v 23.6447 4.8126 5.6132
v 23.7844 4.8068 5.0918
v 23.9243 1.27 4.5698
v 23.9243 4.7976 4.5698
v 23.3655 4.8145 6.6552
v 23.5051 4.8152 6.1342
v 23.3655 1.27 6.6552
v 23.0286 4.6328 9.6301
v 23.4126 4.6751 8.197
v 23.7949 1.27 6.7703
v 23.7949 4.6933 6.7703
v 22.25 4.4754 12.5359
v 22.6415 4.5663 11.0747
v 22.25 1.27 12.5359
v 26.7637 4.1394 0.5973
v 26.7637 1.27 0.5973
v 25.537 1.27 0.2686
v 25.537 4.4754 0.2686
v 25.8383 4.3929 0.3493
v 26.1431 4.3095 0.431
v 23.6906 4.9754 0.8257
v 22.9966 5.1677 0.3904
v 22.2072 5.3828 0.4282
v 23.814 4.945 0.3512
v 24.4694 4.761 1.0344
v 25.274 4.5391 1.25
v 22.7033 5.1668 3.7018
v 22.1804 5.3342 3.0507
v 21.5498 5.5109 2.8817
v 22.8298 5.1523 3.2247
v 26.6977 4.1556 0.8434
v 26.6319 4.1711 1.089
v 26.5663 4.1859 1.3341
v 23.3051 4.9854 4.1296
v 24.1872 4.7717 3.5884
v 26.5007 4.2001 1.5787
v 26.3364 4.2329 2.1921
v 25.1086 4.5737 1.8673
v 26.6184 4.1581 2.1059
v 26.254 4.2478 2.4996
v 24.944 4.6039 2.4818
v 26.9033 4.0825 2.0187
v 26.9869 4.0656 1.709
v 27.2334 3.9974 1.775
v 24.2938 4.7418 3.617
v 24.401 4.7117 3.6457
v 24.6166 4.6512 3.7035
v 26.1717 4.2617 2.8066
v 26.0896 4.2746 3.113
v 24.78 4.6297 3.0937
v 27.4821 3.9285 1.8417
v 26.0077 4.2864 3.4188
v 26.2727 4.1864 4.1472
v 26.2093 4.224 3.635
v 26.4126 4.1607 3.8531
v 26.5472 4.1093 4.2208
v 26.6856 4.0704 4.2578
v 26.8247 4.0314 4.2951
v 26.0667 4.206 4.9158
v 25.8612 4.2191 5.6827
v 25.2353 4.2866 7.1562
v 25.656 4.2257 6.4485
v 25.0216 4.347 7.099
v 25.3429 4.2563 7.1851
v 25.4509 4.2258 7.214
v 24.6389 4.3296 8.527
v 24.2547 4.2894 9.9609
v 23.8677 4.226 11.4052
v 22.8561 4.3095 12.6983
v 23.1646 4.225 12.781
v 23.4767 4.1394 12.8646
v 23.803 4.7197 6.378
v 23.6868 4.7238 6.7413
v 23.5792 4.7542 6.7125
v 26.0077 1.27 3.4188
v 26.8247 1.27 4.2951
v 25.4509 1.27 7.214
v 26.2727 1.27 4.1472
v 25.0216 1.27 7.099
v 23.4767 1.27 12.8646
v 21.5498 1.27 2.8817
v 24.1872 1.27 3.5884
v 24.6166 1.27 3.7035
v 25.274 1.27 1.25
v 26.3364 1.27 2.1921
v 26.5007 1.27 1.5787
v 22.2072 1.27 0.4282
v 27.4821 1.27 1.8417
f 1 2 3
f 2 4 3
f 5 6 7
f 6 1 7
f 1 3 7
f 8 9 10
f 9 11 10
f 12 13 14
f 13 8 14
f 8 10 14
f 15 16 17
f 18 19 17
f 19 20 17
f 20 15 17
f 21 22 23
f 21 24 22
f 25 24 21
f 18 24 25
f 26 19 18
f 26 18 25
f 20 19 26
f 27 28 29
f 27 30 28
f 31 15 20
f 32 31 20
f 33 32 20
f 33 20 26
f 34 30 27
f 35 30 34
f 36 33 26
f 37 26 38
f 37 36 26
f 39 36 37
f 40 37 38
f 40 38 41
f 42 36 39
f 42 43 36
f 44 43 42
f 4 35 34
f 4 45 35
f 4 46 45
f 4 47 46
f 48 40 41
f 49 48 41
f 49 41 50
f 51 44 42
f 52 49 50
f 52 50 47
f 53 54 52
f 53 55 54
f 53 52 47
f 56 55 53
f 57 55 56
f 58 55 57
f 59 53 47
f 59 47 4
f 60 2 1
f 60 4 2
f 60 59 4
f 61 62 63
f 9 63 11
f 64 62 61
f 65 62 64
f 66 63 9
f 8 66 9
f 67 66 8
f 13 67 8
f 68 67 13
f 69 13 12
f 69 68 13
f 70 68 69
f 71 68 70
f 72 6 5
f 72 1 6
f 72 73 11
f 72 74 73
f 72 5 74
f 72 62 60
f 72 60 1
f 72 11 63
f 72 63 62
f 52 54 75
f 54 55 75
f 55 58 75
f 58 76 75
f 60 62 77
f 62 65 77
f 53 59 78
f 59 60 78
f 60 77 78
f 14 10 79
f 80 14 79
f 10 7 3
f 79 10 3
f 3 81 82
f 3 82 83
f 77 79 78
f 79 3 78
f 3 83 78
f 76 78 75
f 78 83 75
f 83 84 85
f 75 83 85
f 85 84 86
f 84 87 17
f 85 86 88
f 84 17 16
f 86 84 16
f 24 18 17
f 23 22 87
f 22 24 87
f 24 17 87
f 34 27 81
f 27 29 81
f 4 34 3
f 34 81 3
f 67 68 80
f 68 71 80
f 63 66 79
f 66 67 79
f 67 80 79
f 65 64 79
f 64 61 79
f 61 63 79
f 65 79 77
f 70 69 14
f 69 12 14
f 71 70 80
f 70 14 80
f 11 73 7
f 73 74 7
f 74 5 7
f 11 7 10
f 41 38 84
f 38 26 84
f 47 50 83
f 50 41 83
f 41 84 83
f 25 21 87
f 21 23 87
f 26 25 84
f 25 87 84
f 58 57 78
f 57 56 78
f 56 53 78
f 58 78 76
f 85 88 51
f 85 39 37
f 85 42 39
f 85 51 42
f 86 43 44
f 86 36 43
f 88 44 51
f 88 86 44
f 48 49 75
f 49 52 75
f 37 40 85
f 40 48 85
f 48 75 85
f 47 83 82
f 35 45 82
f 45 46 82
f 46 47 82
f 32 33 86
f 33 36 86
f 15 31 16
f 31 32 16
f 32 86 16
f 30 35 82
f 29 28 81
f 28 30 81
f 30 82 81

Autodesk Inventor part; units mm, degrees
ref_plane "YZ Plane" through (0, 0, 0) normal (1, 0, 0) x (0, 1, 0)
ref_plane "XZ Plane" through (0, 0, 0) normal (0, 1, 0) x (-1, 0, 0)
ref_plane "XY Plane" through (0, 0, 0) normal (0, 0, 1) x (1, 0, 0)
sketch "Sketch1" plane through (0, 0, 0) normal (0, 0, 1) x (1, 0, 0)
  line L0 (0, 0) -> (0, 8.6646) construction
  line L1 (20.9931, 1.27) -> (20.9931, 5.715)
  line L2 (20.9931, 5.715) -> (27.9781, 3.81)
  line L3 (27.9781, 3.81) -> (27.9781, 0)
  line L4 (27.9781, 0) -> (20.9931, 0)
  line L5 (20.9931, 1.27) -> (18.4531, 1.27)
  line L6 (18.4531, 1.27) -> (18.4531, 0)
  line L7 (18.4531, 0) -> (20.9931, 0)
  dimension "d0" = 20.9931
  dimension "d1" = 4.445
  dimension "d2" = 1.27
  dimension "d3" = 2.54
  dimension "d4" = 3.81
  dimension "d5" = 6.985
revolve "Revolution1" add sketch "Sketch1" angle 360 about axis through (0, 0, 0) along (0, 1, 0)
sketch "Sketch2" plane through (0, 1.27, 0) normal (0, 1, 0) x (1, 0, 0)
  circle A0 centre (0, 0) radius 20.9931 projected
  circle A1 centre (0, 0) radius 27.9781 projected
  circle A2 centre (0, 0) radius 18.4531 projected
  line L0 (-4.2505, -7.1349) -> (4.1315, -7.1349) projected
  circle A3 centre (0, 0) radius 19.685 projected
  line L1 (-12.7595, -2.2222) -> (-12.7595, -29.7716) construction
  line L2 (12.6405, -2.2222) -> (12.6405, -30.8961) construction
  line L3 (-12.7549, -7.1349) -> (-31.6502, -7.1349) construction
  line L4 (0, 0) -> (17.3317, 30.0193) construction
  line L5 (-18.5741, 9.7833) -> (-25.4, 9.7833)
  line L6 (-18.8949, 9.1483) -> (-25.4, 9.1483)
  line L7 (-25.4, 9.1483) -> (-25.4, 9.7833)
  line L8 (-19.8553, -6.8174) -> (-25.4, -6.8174)
  line L9 (-25.4, -6.8174) -> (-25.4, -7.4524)
  line L10 (-25.4, -7.4524) -> (-19.6258, -7.4524)
  line L11 (0.1351, 9.4658) -> (-31.517, 9.4658) construction
  line L12 (-24.13, 9.1483) -> (-22.86, 6.9486)
  line L13 (-22.86, 6.9486) -> (-25.4, 6.9486)
  line L14 (-25.4, 6.9486) -> (-24.13, 9.1483)
  line L15 (-24.13, -6.8174) -> (-25.4, -4.6177)
  line L16 (-25.4, -4.6177) -> (-22.86, -4.6177)
  line L17 (-22.86, -4.6177) -> (-24.13, -6.8174)
  line L18 (-29.0818, 1.1654) -> (-16.5563, 1.1654) construction
  line L19 (-24.13, 7.6818) -> (-24.13, -5.3509) construction
  line L20 (-23.8125, 2.4354) -> (-24.4475, 2.4354)
  line L21 (-24.4475, 2.4354) -> (-24.4475, 6.9486)
  line L22 (-24.4475, 6.9486) -> (-23.8125, 6.9486)
  line L23 (-23.8125, 6.9486) -> (-23.8125, 2.4354)
  line L24 (-23.8125, 2.4354) -> (-24.4475, 6.9486) construction
  line L25 (-24.4475, 2.4354) -> (-23.8125, 6.9486) construction
  line L26 (-23.8125, -0.1046) -> (-24.4475, -0.1046)
  line L27 (-24.4475, -0.1046) -> (-24.4475, -4.6177)
  line L28 (-24.4475, -4.6177) -> (-23.8125, -4.6177)
  line L29 (-23.8125, -4.6177) -> (-23.8125, -0.1046)
  line L30 (-23.8125, -0.1046) -> (-24.4475, -4.6177) construction
  line L31 (-24.4475, -0.1046) -> (-23.8125, -4.6177) construction
  line L32 (-13.077, -16.4226) -> (-13.077, -23.7886)
  line L33 (-13.077, -23.7886) -> (-12.442, -23.7886)
  line L34 (-12.442, -23.7886) -> (-12.442, -16.9088)
  line L35 (12.323, -16.9957) -> (12.323, -23.7886)
  line L36 (12.323, -23.7886) -> (12.958, -23.7886)
  line L37 (12.958, -23.7886) -> (12.958, -16.5167)
  line L38 (-12.442, -22.5186) -> (-10.2423, -21.2486)
  line L39 (-10.2423, -21.2486) -> (-10.2423, -23.7886)
  line L40 (-10.2423, -23.7886) -> (-12.442, -22.5186)
  line L41 (12.323, -22.5186) -> (10.1233, -23.7886)
  line L42 (10.1233, -23.7886) -> (10.1233, -21.2486)
  line L43 (10.1233, -21.2486) -> (12.323, -22.5186)
  line L44 (-3.8695, -21.2486) -> (3.7505, -21.2486) construction
  line L45 (3.7505, -21.2486) -> (3.7505, -23.7886) construction
  line L46 (3.7505, -23.7886) -> (-3.8695, -23.7886) construction
  line L47 (-3.8695, -23.7886) -> (-3.8695, -21.2486) construction
  line L48 (-0.0595, -13.6296) -> (-0.0595, -32.797) construction
  line L49 (-10.2423, -22.5186) -> (10.1233, -22.5186) construction
  line L50 (-4.2505, -22.8361) -> (-10.2423, -22.8361)
  line L51 (-10.2423, -22.8361) -> (-10.2423, -22.2011)
  line L52 (-10.2423, -22.2011) -> (-4.2505, -22.2011)
  line L53 (-4.2505, -22.2011) -> (-4.2505, -22.8361)
  line L54 (-4.2505, -22.8361) -> (-10.2423, -22.2011) construction
  line L55 (-10.2423, -22.8361) -> (-4.2505, -22.2011) construction
  line L56 (4.1315, -22.2011) -> (10.1233, -22.2011)
  line L57 (10.1233, -22.2011) -> (10.1233, -22.8361)
  line L58 (10.1233, -22.8361) -> (4.1315, -22.8361)
  line L59 (4.1315, -22.8361) -> (4.1315, -22.2011)
  line L60 (4.1315, -22.2011) -> (10.1233, -22.8361) construction
  line L61 (10.1233, -22.2011) -> (4.1315, -22.8361) construction
  line L62 (10.2204, 18.3372) -> (11.1133, 19.8839)
  line L63 (11.1133, 19.8839) -> (11.6633, 19.5664)
  line L64 (11.6633, 19.5664) -> (10.7703, 18.0197)
  line L65 (12.8992, 20.8364) -> (18.6142, 20.8364) construction
  line L66 (18.6142, 20.8364) -> (18.6142, 18.2964) construction
  line L67 (18.6142, 18.2964) -> (12.8992, 18.2964) construction
  line L68 (12.8992, 18.2964) -> (12.8992, 20.8364) construction
  line L69 (11.1133, 19.8839) -> (12.8992, 19.8839)
  line L70 (12.8992, 19.8839) -> (12.8992, 19.2489)
  line L71 (12.8992, 19.2489) -> (11.1133, 19.2489)
  line L72 (11.1133, 19.2489) -> (11.1133, 19.8839)
  line L73 (11.1133, 19.8839) -> (12.8992, 19.2489) construction
  line L74 (12.8992, 19.8839) -> (11.1133, 19.2489) construction
  circle A4 centre (0, 0) radius 22.8981 construction
  line L75 (11.4654, -8.564) -> (6.3194, -8.564) projected
  spline S0 degree 2 poles (-4.3048, 23.0885) (-4.5009, 22.6771) (-4.9694, 22.2828) (-5.345, 22.1916) knots 0 0 0 1 2 2 2
  spline S1 degree 2 poles (-5.345, 22.1916) (-5.9856, 22.0361) (-6.5218, 22.4794) knots 0 0 0 1 1 1
  spline S2 degree 2 poles (-6.5218, 22.4794) (-7.071, 22.9258) (-7.2859, 23.8109) knots 0 0 0 1 1 1
  spline S3 degree 2 poles (-7.2859, 23.8109) (-7.5233, 24.7892) (-7.1789, 25.4155) knots 0 0 0 1 1 1
  spline S4 degree 2 poles (-7.1789, 25.4155) (-6.903, 25.9172) (-6.3614, 26.0486) knots 0 0 0 1 1 1
  spline S5 degree 2 poles (-6.3614, 26.0486) (-5.9392, 26.1511) (-5.6643, 26.0853) knots 0 0 0 1 1 1
  spline S6 degree 2 poles (-5.6643, 26.0853) (-5.3596, 26.0112) (-5.0862, 25.7107) knots 0 0 0 1 1 1
  spline S7 degree 2 poles (-5.0862, 25.7107) (-5.0278, 25.6478) (-5.0115, 25.5808) knots 0 0 0 1 1 1
  spline S8 degree 2 poles (-5.0115, 25.5808) (-4.9832, 25.4644) (-5.1191, 25.2618) (-5.2268, 25.2357) knots 0 0 0 1 2 2 2
  spline S9 degree 2 poles (-5.2268, 25.2357) (-5.3782, 25.1989) (-5.5051, 25.3408) knots 0 0 0 1 1 1
  spline S10 degree 2 poles (-5.5051, 25.3408) (-5.6451, 25.4856) (-5.8317, 25.5174) knots 0 0 0 1 1 1
  spline S11 degree 2 poles (-5.8317, 25.5174) (-5.9746, 25.5475) (-6.2279, 25.486) knots 0 0 0 1 1 1
  spline S12 degree 2 poles (-6.2279, 25.486) (-6.5569, 25.4061) (-6.7127, 25.0569) knots 0 0 0 1 1 1
  spline S13 degree 2 poles (-6.7127, 25.0569) (-6.906, 24.6338) (-6.7385, 23.9438) knots 0 0 0 1 1 1
  spline S14 degree 2 poles (-6.7385, 23.9438) (-6.5844, 23.309) (-5.8687, 22.6596) (-5.4727, 22.7557) knots 0 0 0 1 2 2 2
  spline S15 degree 2 poles (-5.4727, 22.7557) (-5.0447, 22.8596) (-4.8204, 23.3456) knots 0 0 0 1 1 1
  spline S16 degree 2 poles (-4.8204, 23.3456) (-4.7629, 23.4644) (-4.6377, 23.4948) knots 0 0 0 1 1 1
  spline S17 degree 2 poles (-4.6377, 23.4948) (-4.53, 23.521) (-4.3078, 23.393) (-4.2802, 23.2794) knots 0 0 0 1 2 2 2
  spline S18 degree 2 poles (-4.2802, 23.2794) (-4.2576, 23.1863) (-4.3048, 23.0885) knots 0 0 0 1 1 1
  spline S19 degree 2 poles (-2.5624, 23.1168) (-2.545, 22.971) (-2.7214, 22.7539) (-2.8582, 22.7376) knots 0 0 0 1 2 2 2
  spline S20 degree 2 poles (-2.8582, 22.7376) (-3.007, 22.7199) (-3.2201, 22.8877) (-3.2378, 23.0364) knots 0 0 0 1 2 2 2
  spline S21 degree 2 poles (-3.2378, 23.0364) (-3.254, 23.1733) (-3.087, 23.3923) (-2.9382, 23.41) knots 0 0 0 1 2 2 2
  spline S22 degree 2 poles (-2.9382, 23.41) (-2.8014, 23.4263) (-2.5783, 23.2507) (-2.5624, 23.1168) knots 0 0 0 1 2 2 2
  spline S23 degree 2 poles (1.6575, 23.2292) (1.6783, 23.1693) (1.6781, 23.1183) knots 0 0 0 1 1 1
  spline S24 degree 2 poles (1.6781, 23.1183) (1.6778, 22.9955) (1.4946, 22.8432) (1.3837, 22.8435) knots 0 0 0 1 2 2 2
  spline S25 degree 2 poles (1.3837, 22.8435) (1.189, 22.844) (1.1206, 23.024) knots 0 0 0 1 1 1
  line L76 (1.1206, 23.024) -> (0.9153, 23.5578)
  line L77 (0.9153, 23.5578) -> (-0.8255, 23.5626)
  line L78 (-0.8255, 23.5626) -> (-1.0307, 23.0328)
  spline S26 degree 2 poles (-1.0307, 23.0328) (-1.1001, 22.8503) (-1.2888, 22.8508) knots 0 0 0 1 1 1
  spline S27 degree 2 poles (-1.2888, 22.8508) (-1.4087, 22.8511) (-1.585, 23.0074) (-1.5847, 23.1272) knots 0 0 0 1 2 2 2
  spline S28 degree 2 poles (-1.5847, 23.1272) (-1.5846, 23.1812) (-1.5665, 23.2291) knots 0 0 0 1 1 1
  line L79 (-1.5665, 23.2291) -> (-0.2988, 26.5993)
  spline S29 degree 2 poles (-0.2988, 26.5993) (-0.2174, 26.8148) (0.0283, 26.8141) knots 0 0 0 1 1 1
  spline S30 degree 2 poles (0.0283, 26.8141) (0.28, 26.8135) (0.3484, 26.6245) knots 0 0 0 1 1 1
  line L80 (0.3484, 26.6245) -> (1.6575, 23.2292)
  line L81 (0.7221, 24.1366) -> (0.026, 25.9722)
  line L82 (0.026, 25.9722) -> (-0.6322, 24.1403)
  line L83 (-0.6322, 24.1403) -> (0.7221, 24.1366)
  spline S31 degree 2 poles (3.0603, 23.0562) (3.0422, 22.9105) (2.8189, 22.742) (2.6821, 22.7591) knots 0 0 0 1 2 2 2
  spline S32 degree 2 poles (2.6821, 22.7591) (2.5335, 22.7776) (2.3669, 22.9916) (2.3854, 23.1402) knots 0 0 0 1 2 2 2
  spline S33 degree 2 poles (2.3854, 23.1402) (2.4024, 23.277) (2.6172, 23.4495) (2.7658, 23.431) knots 0 0 0 1 2 2 2
  spline S34 degree 2 poles (2.7658, 23.431) (2.9026, 23.414) (3.077, 23.19) (3.0603, 23.0562) knots 0 0 0 1 2 2 2
  spline S35 degree 2 poles (7.2494, 23.9177) (6.9985, 22.8964) (6.3258, 22.4939) knots 0 0 0 1 1 1
  spline S36 degree 2 poles (6.3258, 22.4939) (5.7821, 22.1647) (5.1478, 22.3205) knots 0 0 0 1 1 1
  line L84 (5.1478, 22.3205) -> (4.1323, 22.5699)
  line L85 (4.1323, 22.5699) -> (5.0564, 26.3321)
  line L86 (5.0564, 26.3321) -> (6.069, 26.0834)
  spline S37 degree 2 poles (6.069, 26.0834) (6.6946, 25.9298) (7.047, 25.4051) knots 0 0 0 1 1 1
  spline S38 degree 2 poles (7.047, 25.4051) (7.4616, 24.7818) (7.2494, 23.9177) knots 0 0 0 1 1 1
  spline S39 degree 2 poles (6.7023, 24.052) (6.8474, 24.6427) (6.5732, 25.0587) knots 0 0 0 1 1 1
  spline S40 degree 2 poles (6.5732, 25.0587) (6.337, 25.416) (5.9267, 25.5167) knots 0 0 0 1 1 1
  line L87 (5.9267, 25.5167) -> (5.4641, 25.6304)
  line L88 (5.4641, 25.6304) -> (4.8173, 22.9971)
  line L89 (4.8173, 22.9971) -> (5.2857, 22.882)
  spline S41 degree 2 poles (5.2857, 22.882) (5.7047, 22.7791) (6.047, 22.9666) knots 0 0 0 1 1 1
  spline S42 degree 2 poles (6.047, 22.9666) (6.5215, 23.3159) (6.7023, 24.052) knots 0 0 0 1 1 1
  line L90 (-26.9128, 0.2129) -> (-27.3651, 0.2129)
  line L91 (-27.3651, 0.2129) -> (-27.3651, 0.7162)
  line L92 (-27.3651, 0.7162) -> (-26.9128, 0.7162)
  line L93 (-26.9128, 0.7162) -> (-26.9128, 0.2129)
  spline S43 degree 2 poles (-25.1468, 0.8613) (-25.1468, 0.5603) (-25.5281, 0.1728) (-25.8615, 0.1728) knots 0 0 0 1 2 2 2
  spline S44 degree 2 poles (-25.8615, 0.1728) (-26.0282, 0.1728) (-26.2891, 0.2685) (-26.3802, 0.3627) knots 0 0 0 1 2 2 2
  spline S45 degree 2 poles (-26.3802, 0.3627) (-26.4883, 0.4723) (-26.6041, 0.8196) (-26.6041, 1.062) knots 0 0 0 1 2 2 2
  spline S46 degree 2 poles (-26.6041, 1.062) (-26.6041, 1.3121) (-26.496, 1.7011) (-26.374, 1.8509) knots 0 0 0 1 2 2 2
  spline S47 degree 2 poles (-26.374, 1.8509) (-26.2583, 1.9929) (-25.8816, 2.1535) (-25.6238, 2.1535) knots 0 0 0 1 2 2 2
  spline S48 degree 2 poles (-25.6238, 2.1535) (-25.5296, 2.1535) (-25.3413, 2.1288) (-25.3073, 2.121) knots 0 0 0 1 2 2 2
  line L94 (-25.3073, 2.121) -> (-25.3073, 1.7474)
  line L95 (-25.3073, 1.7474) -> (-25.3413, 1.7474)
  spline S49 degree 2 poles (-25.3413, 1.7474) (-25.3752, 1.7644) (-25.5296, 1.8061) (-25.6284, 1.8061) knots 0 0 0 1 2 2 2
  spline S50 degree 2 poles (-25.6284, 1.8061) (-25.8523, 1.8061) (-26.0962, 1.5699) (-26.1255, 1.3507) knots 0 0 0 1 2 2 2
  spline S51 degree 2 poles (-26.1255, 1.3507) (-26.0313, 1.4109) (-25.8384, 1.4819) (-25.7164, 1.4819) knots 0 0 0 1 2 2 2
  spline S52 degree 2 poles (-25.7164, 1.4819) (-25.613, 1.4819) (-25.4324, 1.4263) (-25.3629, 1.3739) knots 0 0 0 1 2 2 2
  spline S53 degree 2 poles (-25.3629, 1.3739) (-25.2641, 1.2982) (-25.1468, 1.0528) (-25.1468, 0.8613) knots 0 0 0 1 2 2 2
  spline S54 degree 2 poles (-25.7041, 0.5742) (-25.667, 0.6205) (-25.6269, 0.7286) (-25.6269, 0.8382) knots 0 0 0 1 2 2 2
  spline S55 degree 2 poles (-25.6269, 0.8382) (-25.6269, 0.9308) (-25.6732, 1.0512) (-25.7149, 1.0867) knots 0 0 0 1 2 2 2
  spline S56 degree 2 poles (-25.7149, 1.0867) (-25.7581, 1.1238) (-25.8646, 1.15) (-25.9248, 1.15) knots 0 0 0 1 2 2 2
  spline S57 degree 2 poles (-25.9248, 1.15) (-25.9758, 1.15) (-26.0807, 1.1238) (-26.127, 1.1052) knots 0 0 0 1 2 2 2
  spline S58 degree 2 poles (-26.127, 1.1052) (-26.127, 1.0929) (-26.1301, 1.0342) (-26.1301, 0.9895) knots 0 0 0 1 2 2 2
  spline S59 degree 2 poles (-26.1301, 0.9895) (-26.1301, 0.8243) (-26.073, 0.6251) (-26.0282, 0.5742) knots 0 0 0 1 2 2 2
  spline S60 degree 2 poles (-26.0282, 0.5742) (-25.9958, 0.5325) (-25.9094, 0.497) (-25.8631, 0.497) knots 0 0 0 1 2 2 2
  spline S61 degree 2 poles (-25.8631, 0.497) (-25.8245, 0.497) (-25.7349, 0.5356) (-25.7041, 0.5742) knots 0 0 0 1 2 2 2
  spline S62 degree 2 poles (-23.5104, 0.8582) (-23.5104, 0.7085) (-23.6123, 0.4553) (-23.7126, 0.3642) knots 0 0 0 1 2 2 2
  spline S63 degree 2 poles (-23.7126, 0.3642) (-23.8129, 0.2732) (-24.0877, 0.1728) (-24.2884, 0.1728) knots 0 0 0 1 2 2 2
  spline S64 degree 2 poles (-24.2884, 0.1728) (-24.5015, 0.1744) (-24.8071, 0.2438) (-24.9075, 0.2886) knots 0 0 0 1 2 2 2
  line L96 (-24.9075, 0.2886) -> (-24.9075, 0.7039)
  line L97 (-24.9075, 0.7039) -> (-24.8643, 0.7039)
  spline S65 degree 2 poles (-24.8643, 0.7039) (-24.8272, 0.6838) (-24.7377, 0.6313) (-24.6651, 0.6035) knots 0 0 0 1 2 2 2
  spline S66 degree 2 poles (-24.6651, 0.6035) (-24.5972, 0.5773) (-24.4567, 0.5418) (-24.3718, 0.5418) knots 0 0 0 1 2 2 2
  spline S67 degree 2 poles (-24.3718, 0.5418) (-24.2977, 0.5418) (-24.1248, 0.5788) (-24.0723, 0.6282) knots 0 0 0 1 2 2 2
  spline S68 degree 2 poles (-24.0723, 0.6282) (-24.0337, 0.6668) (-23.9905, 0.761) (-23.9905, 0.8397) knots 0 0 0 1 2 2 2
  spline S69 degree 2 poles (-23.9905, 0.8397) (-23.9905, 0.9076) (-24.0461, 1.0034) (-24.0908, 1.0327) knots 0 0 0 1 2 2 2
  spline S70 degree 2 poles (-24.0908, 1.0327) (-24.1557, 1.0759) (-24.3409, 1.1006) (-24.4073, 1.1006) knots 0 0 0 1 2 2 2
  spline S71 degree 2 poles (-24.4073, 1.1006) (-24.5123, 1.1006) (-24.7114, 1.0666) (-24.784, 1.0481) knots 0 0 0 1 2 2 2
  line L98 (-24.784, 1.0481) -> (-24.8257, 1.0481)
  line L99 (-24.8257, 1.0481) -> (-24.8257, 2.1179)
  line L100 (-24.8257, 2.1179) -> (-23.5629, 2.1179)
  line L101 (-23.5629, 2.1179) -> (-23.5629, 1.7583)
  line L102 (-23.5629, 1.7583) -> (-24.3733, 1.7583)
  line L103 (-24.3733, 1.7583) -> (-24.3733, 1.4418)
  spline S72 degree 2 poles (-24.3733, 1.4418) (-24.3347, 1.4449) (-24.2282, 1.448) (-24.1989, 1.448) knots 0 0 0 1 2 2 2
  spline S73 degree 2 poles (-24.1989, 1.448) (-24.0615, 1.448) (-23.8299, 1.3924) (-23.7388, 1.3353) knots 0 0 0 1 2 2 2
  spline S74 degree 2 poles (-23.7388, 1.3353) (-23.6308, 1.2642) (-23.5104, 1.0281) (-23.5104, 0.8582) knots 0 0 0 1 2 2 2
  line L104 (-21.7752, 0.6575) -> (-22.033, 0.6575)
  line L105 (-22.033, 0.6575) -> (-22.033, 0.2083)
  line L106 (-22.033, 0.2083) -> (-22.4946, 0.2083)
  line L107 (-22.4946, 0.2083) -> (-22.4946, 0.6575)
  line L108 (-22.4946, 0.6575) -> (-23.3344, 0.6575)
  line L109 (-23.3344, 0.6575) -> (-23.3344, 1.0126)
  line L110 (-23.3344, 1.0126) -> (-22.51, 2.1179)
  line L111 (-22.51, 2.1179) -> (-22.033, 2.1179)
  line L112 (-22.033, 2.1179) -> (-22.033, 1.0003)
  line L113 (-22.033, 1.0003) -> (-21.7752, 1.0003)
  line L114 (-21.7752, 1.0003) -> (-21.7752, 0.6575)
  line L115 (-22.4946, 1.0003) -> (-22.4946, 1.6486)
  line L116 (-22.4946, 1.6486) -> (-22.9778, 1.0003)
  line L117 (-22.9778, 1.0003) -> (-22.4946, 1.0003)
  line L118 (-2.2979, -23.4704) -> (-3.5561, -23.4704)
  line L119 (-3.5561, -23.4704) -> (-3.5561, -23.1385)
  line L120 (-3.5561, -23.1385) -> (-3.1547, -23.1385)
  line L121 (-3.1547, -23.1385) -> (-3.1547, -22.1304)
  line L122 (-3.1547, -22.1304) -> (-3.5561, -22.1304)
  line L123 (-3.5561, -22.1304) -> (-3.5561, -21.8201)
  spline S75 degree 2 poles (-3.5561, -21.8201) (-3.4681, -21.8201) (-3.2937, -21.7969) (-3.2412, -21.7722) knots 0 0 0 1 2 2 2
  spline S76 degree 2 poles (-3.2412, -21.7722) (-3.181, -21.7413) (-3.113, -21.6379) (-3.1069, -21.5607) knots 0 0 0 1 2 2 2
  line L124 (-3.1069, -21.5607) -> (-2.69, -21.5607)
  line L125 (-2.69, -21.5607) -> (-2.69, -23.1385)
  line L126 (-2.69, -23.1385) -> (-2.2979, -23.1385)
  line L127 (-2.2979, -23.1385) -> (-2.2979, -23.4704)
  line L128 (-1.5029, -23.4704) -> (-1.9552, -23.4704)
  line L129 (-1.9552, -23.4704) -> (-1.9552, -22.9671)
  line L130 (-1.9552, -22.9671) -> (-1.5029, -22.9671)
  line L131 (-1.5029, -22.9671) -> (-1.5029, -23.4704)
  spline S77 degree 2 poles (0.2493, -22.5179) (0.2493, -22.7649) (0.1705, -23.1354) (0.0825, -23.2604) knots 0 0 0 1 2 2 2
  spline S78 degree 2 poles (0.0825, -23.2604) (-0.0039, -23.3839) (-0.2833, -23.5105) (-0.484, -23.5105) knots 0 0 0 1 2 2 2
  spline S79 degree 2 poles (-0.484, -23.5105) (-0.6862, -23.5105) (-0.9641, -23.3839) (-1.0521, -23.2573) knots 0 0 0 1 2 2 2
  spline S80 degree 2 poles (-1.0521, -23.2573) (-1.1401, -23.1323) (-1.2188, -22.7649) (-1.2188, -22.5179) knots 0 0 0 1 2 2 2
  spline S81 degree 2 poles (-1.2188, -22.5179) (-1.2188, -22.2647) (-1.1401, -21.9065) (-1.0506, -21.7769) knots 0 0 0 1 2 2 2
  spline S82 degree 2 poles (-1.0506, -21.7769) (-0.961, -21.6503) (-0.6785, -21.5268) (-0.484, -21.5268) knots 0 0 0 1 2 2 2
  spline S83 degree 2 poles (-0.484, -21.5268) (-0.2787, -21.5268) (-0.0039, -21.6564) (0.0841, -21.7846) knots 0 0 0 1 2 2 2
  spline S84 degree 2 poles (0.0841, -21.7846) (0.1705, -21.9096) (0.2493, -22.2786) (0.2493, -22.5179) knots 0 0 0 1 2 2 2
  spline S85 degree 2 poles (-0.2308, -22.5179) (-0.2308, -22.1643) (-0.3466, -21.8787) (-0.484, -21.8787) knots 0 0 0 1 2 2 2
  spline S86 degree 2 poles (-0.484, -21.8787) (-0.6214, -21.8787) (-0.7387, -22.1643) (-0.7387, -22.5194) knots 0 0 0 1 2 2 2
  spline S87 degree 2 poles (-0.7387, -22.5194) (-0.7387, -22.8683) (-0.6214, -23.1585) (-0.484, -23.1585) knots 0 0 0 1 2 2 2
  spline S88 degree 2 poles (-0.484, -23.1585) (-0.3482, -23.1585) (-0.2308, -22.8683) (-0.2308, -22.5179) knots 0 0 0 1 2 2 2
  spline S89 degree 2 poles (1.9181, -22.5179) (1.9181, -22.7649) (1.8393, -23.1354) (1.7513, -23.2604) knots 0 0 0 1 2 2 2
  spline S90 degree 2 poles (1.7513, -23.2604) (1.6649, -23.3839) (1.3855, -23.5105) (1.1848, -23.5105) knots 0 0 0 1 2 2 2
  spline S91 degree 2 poles (1.1848, -23.5105) (0.9826, -23.5105) (0.7047, -23.3839) (0.6167, -23.2573) knots 0 0 0 1 2 2 2
  spline S92 degree 2 poles (0.6167, -23.2573) (0.5287, -23.1323) (0.45, -22.7649) (0.45, -22.5179) knots 0 0 0 1 2 2 2
  spline S93 degree 2 poles (0.45, -22.5179) (0.45, -22.2647) (0.5287, -21.9065) (0.6182, -21.7769) knots 0 0 0 1 2 2 2
  spline S94 degree 2 poles (0.6182, -21.7769) (0.7078, -21.6503) (0.9903, -21.5268) (1.1848, -21.5268) knots 0 0 0 1 2 2 2
  spline S95 degree 2 poles (1.1848, -21.5268) (1.3901, -21.5268) (1.6649, -21.6564) (1.7529, -21.7846) knots 0 0 0 1 2 2 2
  spline S96 degree 2 poles (1.7529, -21.7846) (1.8393, -21.9096) (1.9181, -22.2786) (1.9181, -22.5179) knots 0 0 0 1 2 2 2
  spline S97 degree 2 poles (1.438, -22.5179) (1.438, -22.1643) (1.3222, -21.8787) (1.1848, -21.8787) knots 0 0 0 1 2 2 2
  spline S98 degree 2 poles (1.1848, -21.8787) (1.0474, -21.8787) (0.9301, -22.1643) (0.9301, -22.5194) knots 0 0 0 1 2 2 2
  spline S99 degree 2 poles (0.9301, -22.5194) (0.9301, -22.8683) (1.0474, -23.1585) (1.1848, -23.1585) knots 0 0 0 1 2 2 2
  spline S100 degree 2 poles (1.1848, -23.1585) (1.3206, -23.1585) (1.438, -22.8683) (1.438, -22.5179) knots 0 0 0 1 2 2 2
  spline S101 degree 2 poles (3.5869, -22.5179) (3.5869, -22.7649) (3.5081, -23.1354) (3.4202, -23.2604) knots 0 0 0 1 2 2 2
  spline S102 degree 2 poles (3.4202, -23.2604) (3.3337, -23.3839) (3.0543, -23.5105) (2.8536, -23.5105) knots 0 0 0 1 2 2 2
  spline S103 degree 2 poles (2.8536, -23.5105) (2.6514, -23.5105) (2.3735, -23.3839) (2.2855, -23.2573) knots 0 0 0 1 2 2 2
  spline S104 degree 2 poles (2.2855, -23.2573) (2.1975, -23.1323) (2.1188, -22.7649) (2.1188, -22.5179) knots 0 0 0 1 2 2 2
  spline S105 degree 2 poles (2.1188, -22.5179) (2.1188, -22.2647) (2.1975, -21.9065) (2.287, -21.7769) knots 0 0 0 1 2 2 2
  spline S106 degree 2 poles (2.287, -21.7769) (2.3766, -21.6503) (2.6591, -21.5268) (2.8536, -21.5268) knots 0 0 0 1 2 2 2
  spline S107 degree 2 poles (2.8536, -21.5268) (3.0589, -21.5268) (3.3337, -21.6564) (3.4217, -21.7846) knots 0 0 0 1 2 2 2
  spline S108 degree 2 poles (3.4217, -21.7846) (3.5081, -21.9096) (3.5869, -22.2786) (3.5869, -22.5179) knots 0 0 0 1 2 2 2
  spline S109 degree 2 poles (3.1068, -22.5179) (3.1068, -22.1643) (2.991, -21.8787) (2.8536, -21.8787) knots 0 0 0 1 2 2 2
  spline S110 degree 2 poles (2.8536, -21.8787) (2.7162, -21.8787) (2.5989, -22.1643) (2.5989, -22.5194) knots 0 0 0 1 2 2 2
  spline S111 degree 2 poles (2.5989, -22.5194) (2.5989, -22.8683) (2.7162, -23.1585) (2.8536, -23.1585) knots 0 0 0 1 2 2 2
  spline S112 degree 2 poles (2.8536, -23.1585) (2.9894, -23.1585) (3.1068, -22.8683) (3.1068, -22.5179) knots 0 0 0 1 2 2 2
  line L132 (14.3527, 18.6316) -> (13.0945, 18.6316)
  line L133 (13.0945, 18.6316) -> (13.0945, 18.9635)
  line L134 (13.0945, 18.9635) -> (13.4959, 18.9635)
  line L135 (13.4959, 18.9635) -> (13.4959, 19.9716)
  line L136 (13.4959, 19.9716) -> (13.0945, 19.9716)
  line L137 (13.0945, 19.9716) -> (13.0945, 20.2819)
  spline S113 degree 2 poles (13.0945, 20.2819) (13.1825, 20.2819) (13.357, 20.3051) (13.4094, 20.3298) knots 0 0 0 1 2 2 2
  spline S114 degree 2 poles (13.4094, 20.3298) (13.4697, 20.3606) (13.5376, 20.4641) (13.5438, 20.5412) knots 0 0 0 1 2 2 2
  line L138 (13.5438, 20.5412) -> (13.9606, 20.5412)
  line L139 (13.9606, 20.5412) -> (13.9606, 18.9635)
  line L140 (13.9606, 18.9635) -> (14.3527, 18.9635)
  line L141 (14.3527, 18.9635) -> (14.3527, 18.6316)
  line L142 (15.1477, 18.6316) -> (14.6954, 18.6316)
  line L143 (14.6954, 18.6316) -> (14.6954, 19.1349)
  line L144 (14.6954, 19.1349) -> (15.1477, 19.1349)
  line L145 (15.1477, 19.1349) -> (15.1477, 18.6316)
  spline S115 degree 2 poles (16.8814, 19.2769) (16.8814, 19.1272) (16.7795, 18.874) (16.6791, 18.7829) knots 0 0 0 1 2 2 2
  spline S116 degree 2 poles (16.6791, 18.7829) (16.5788, 18.6918) (16.304, 18.5915) (16.1033, 18.5915) knots 0 0 0 1 2 2 2
  spline S117 degree 2 poles (16.1033, 18.5915) (15.8903, 18.593) (15.5846, 18.6625) (15.4843, 18.7073) knots 0 0 0 1 2 2 2
  line L146 (15.4843, 18.7073) -> (15.4843, 19.1225)
  line L147 (15.4843, 19.1225) -> (15.5275, 19.1225)
  spline S118 degree 2 poles (15.5275, 19.1225) (15.5645, 19.1025) (15.6541, 19.05) (15.7266, 19.0222) knots 0 0 0 1 2 2 2
  spline S119 degree 2 poles (15.7266, 19.0222) (15.7946, 18.9959) (15.935, 18.9604) (16.0199, 18.9604) knots 0 0 0 1 2 2 2
  spline S120 degree 2 poles (16.0199, 18.9604) (16.094, 18.9604) (16.2669, 18.9975) (16.3194, 19.0469) knots 0 0 0 1 2 2 2
  spline S121 degree 2 poles (16.3194, 19.0469) (16.358, 19.0855) (16.4013, 19.1796) (16.4013, 19.2584) knots 0 0 0 1 2 2 2
  spline S122 degree 2 poles (16.4013, 19.2584) (16.4013, 19.3263) (16.3457, 19.422) (16.3009, 19.4514) knots 0 0 0 1 2 2 2
  spline S123 degree 2 poles (16.3009, 19.4514) (16.2361, 19.4946) (16.0508, 19.5193) (15.9844, 19.5193) knots 0 0 0 1 2 2 2
  spline S124 degree 2 poles (15.9844, 19.5193) (15.8795, 19.5193) (15.6803, 19.4853) (15.6078, 19.4668) knots 0 0 0 1 2 2 2
  line L148 (15.6078, 19.4668) -> (15.5661, 19.4668)
  line L149 (15.5661, 19.4668) -> (15.5661, 20.5366)
  line L150 (15.5661, 20.5366) -> (16.8289, 20.5366)
  line L151 (16.8289, 20.5366) -> (16.8289, 20.1769)
  line L152 (16.8289, 20.1769) -> (16.0184, 20.1769)
  line L153 (16.0184, 20.1769) -> (16.0184, 19.8604)
  spline S125 degree 2 poles (16.0184, 19.8604) (16.057, 19.8635) (16.1635, 19.8666) (16.1928, 19.8666) knots 0 0 0 1 2 2 2
  spline S126 degree 2 poles (16.1928, 19.8666) (16.3302, 19.8666) (16.5618, 19.811) (16.6529, 19.7539) knots 0 0 0 1 2 2 2
  spline S127 degree 2 poles (16.6529, 19.7539) (16.7609, 19.6829) (16.8814, 19.4467) (16.8814, 19.2769) knots 0 0 0 1 2 2 2
  spline S128 degree 2 poles (18.5502, 19.2769) (18.5502, 19.1272) (18.4483, 18.874) (18.3479, 18.7829) knots 0 0 0 1 2 2 2
  spline S129 degree 2 poles (18.3479, 18.7829) (18.2476, 18.6918) (17.9728, 18.5915) (17.7721, 18.5915) knots 0 0 0 1 2 2 2
  spline S130 degree 2 poles (17.7721, 18.5915) (17.5591, 18.593) (17.2534, 18.6625) (17.1531, 18.7073) knots 0 0 0 1 2 2 2
  line L154 (17.1531, 18.7073) -> (17.1531, 19.1225)
  line L155 (17.1531, 19.1225) -> (17.1963, 19.1225)
  spline S131 degree 2 poles (17.1963, 19.1225) (17.2333, 19.1025) (17.3229, 19.05) (17.3954, 19.0222) knots 0 0 0 1 2 2 2
  spline S132 degree 2 poles (17.3954, 19.0222) (17.4634, 18.9959) (17.6038, 18.9604) (17.6887, 18.9604) knots 0 0 0 1 2 2 2
  spline S133 degree 2 poles (17.6887, 18.9604) (17.7628, 18.9604) (17.9358, 18.9975) (17.9882, 19.0469) knots 0 0 0 1 2 2 2
  spline S134 degree 2 poles (17.9882, 19.0469) (18.0268, 19.0855) (18.0701, 19.1796) (18.0701, 19.2584) knots 0 0 0 1 2 2 2
  spline S135 degree 2 poles (18.0701, 19.2584) (18.0701, 19.3263) (18.0145, 19.422) (17.9697, 19.4514) knots 0 0 0 1 2 2 2
  spline S136 degree 2 poles (17.9697, 19.4514) (17.9049, 19.4946) (17.7196, 19.5193) (17.6532, 19.5193) knots 0 0 0 1 2 2 2
  spline S137 degree 2 poles (17.6532, 19.5193) (17.5483, 19.5193) (17.3491, 19.4853) (17.2766, 19.4668) knots 0 0 0 1 2 2 2
  line L156 (17.2766, 19.4668) -> (17.2349, 19.4668)
  line L157 (17.2349, 19.4668) -> (17.2349, 20.5366)
  line L158 (17.2349, 20.5366) -> (18.4977, 20.5366)
  line L159 (18.4977, 20.5366) -> (18.4977, 20.1769)
  line L160 (18.4977, 20.1769) -> (17.6872, 20.1769)
  line L161 (17.6872, 20.1769) -> (17.6872, 19.8604)
  spline S138 degree 2 poles (17.6872, 19.8604) (17.7258, 19.8635) (17.8323, 19.8666) (17.8616, 19.8666) knots 0 0 0 1 2 2 2
  spline S139 degree 2 poles (17.8616, 19.8666) (17.999, 19.8666) (18.2306, 19.811) (18.3217, 19.7539) knots 0 0 0 1 2 2 2
  spline S140 degree 2 poles (18.3217, 19.7539) (18.4298, 19.6829) (18.5502, 19.4467) (18.5502, 19.2769) knots 0 0 0 1 2 2 2
  point P0 (-10.4828, 14.7667)
  point P1 (-24.13, 4.692)
  point P2 (-24.13, -2.3611)
  point P3 (-10.9755, -22.5186)
  point P4 (10.8565, -22.5186)
  point P5 (-3.8695, -22.5186)
  point P6 (-0.0595, -23.7886)
  point P7 (-7.2464, -22.5186)
  point P8 (7.1274, -22.5186)
  point P9 (12.0063, 19.5664)
  point P10 (12.0063, 19.5664)
  point P11 (18.6142, 19.5664)
  dimension "d60" = 0.635
  dimension "d7" = 39.37
  dimension "d9" = 25.4
  dimension "d11" = 0.635
  dimension "d13" = 25.4
  dimension "d14" = 0.635
  dimension "d15" = 0.3175
  dimension "d16" = 16.6007
  dimension "d17" = 0.3175
  dimension "d18" = 2.54
  dimension "d19" = 1.27
  dimension "d20" = 1.27
  dimension "d21" = 0.635
  dimension "d22" = 0.3175
  dimension "d23" = 7.366
  dimension "d24" = 0.3175
  dimension "d25" = 2.54
  dimension "d26" = 7.62
  dimension "d27" = 2.54
  dimension "d28" = 0.635
  dimension "d29" = 0.381
  dimension "d30" = 0.381
  dimension "d31" = 0.635
  dimension "d32" = 0.3175
  dimension "d33" = 5.715
  dimension "d34" = 2.54
  dimension "d35" = 27.94
  dimension "d36" = 0.635
  dimension "d38" = 60
  dimension "d39" = 1.905
extrude "Extrusion1" cut sketch "Sketch2" along normal through all contours L41 L42 L43 | L38 L39 L40 | L15 L16 L17 | L12 L13 L14 | A0 L62 L72 L71 L64 | L37 L36 L35 A0 | L71 L72 L63 L64 | L64 L63 L69 L70 L71 | A0 L6 L7 L5 | L34 L33 L32 A0 | A0 L10 L9 L8 | L58 L59 L56 L42 | L52 L53 L50 L39 | L23 L20 L21 L13 | L27 L26 L29 L16 | S0 S1 S2 S3 S4 S5 S6 S7 S8 S9 S10 S11 S12 S13 S14 S15 S16 S17 S18 | S19 S20 S21 S22 | S23 S24 S25 L76 L77 L78 S26 S27 S28 L79 S29 S30 L80 | S31 S32 S33 S34 | S35 S36 L84 L85 L86 S37 S38 | L90 L91 L92 L93 | S43 S44 S45 S46 S47 S48 L94 L95 S49 S50 S51 S52 S53 | S62 S63 S64 L96 L97 S65 S66 S67 S68 S69 S70 S71 L98 L99 L100 L101 L102 L103 S72 S73 S74 | L104 L105 L106 L107 L108 L109 L110 L111 L112 L113 L114 | L118 L119 L120 L121 L122 L123 S75 S76 L124 L125 L126 L127 | L128 L129 L130 L131 | S77 S78 S79 S80 S81 S82 S83 S84 | S89 S90 S91 S92 S93 S94 S95 S96 | S101 S102 S103 S104 S105 S106 S107 S108 | L132 L133 L134 L135 L136 L137 S113 S114 L138 L139 L140 L141 | L142 L143 L144 L145 | S115 S116 S117 L146 L147 S118 S119 S120 S121 S122 S123 S124 L148 L149 L150 L151 L152 L153 S125 S126 S127 | S128 S129 S130 L154 L155 S131 S132 S133 S134 S135 S136 S137 L156 L157 L158 L159 L160 L161 S138 S139 S140
sketch "Sketch3" plane through (-25.4, 1.27, -9.7833) normal (0, 1, 0) x (1, 0, 0)
  circle A0 centre (25.4, -9.7833) radius 18.415 projected
  circle A1 centre (25.4, -9.7833) radius 19.685 projected
  circle A2 centre (25.4, -9.7833) radius 27.9781 projected
  line L0 (48.8767, -22.6479) -> (52.1637, -10.3806)
  line L1 (52.1637, -10.3806) -> (50.937, -10.0519)
  line L2 (50.937, -10.0519) -> (47.65, -22.3192)
  line L3 (47.65, -22.3192) -> (48.8767, -22.6479)
  line L4 (48.8767, -22.6479) -> (50.937, -10.0519) construction
  line L5 (52.1637, -10.3806) -> (47.65, -22.3192) construction
  line L6 (49.5872, -13.3717) -> (48.7655, -16.4385)
  line L7 (48.7655, -16.4385) -> (50.8509, -16.9973)
  line L8 (50.8509, -16.9973) -> (51.6727, -13.9305)
  line L9 (51.6727, -13.9305) -> (49.5872, -13.3717)
  line L10 (49.5872, -13.3717) -> (50.8509, -16.9973) construction
  line L11 (48.7655, -16.4385) -> (51.6727, -13.9305) construction
  line L12 (50.937, -10.0519) -> (47.6072, -10.2115)
  line L13 (47.6072, -10.2115) -> (50.674, -11.0333)
  line L14 (49.5872, -13.3717) -> (46.9498, -12.665)
  line L15 (46.9498, -12.665) -> (49.3243, -14.3531)
  line L16 (51.9007, -11.362) -> (52.8821, -11.625)
  line L17 (52.8821, -11.625) -> (51.7364, -11.9754)
  line L18 (25.4, -9.7833) -> (37.7185, -9.7833) construction
  line L19 (51.6727, -13.9305) -> (52.2247, -14.0784)
  line L20 (52.2247, -14.0784) -> (51.4077, -13.2021)
  line L21 (51.4077, -13.2021) -> (51.2433, -13.8154) construction
  point P0 (49.9068, -16.3499)
  point P1 (50.2191, -15.1845)
  dimension "d42" = 3.175
  dimension "d43" = 3.175
  dimension "d44" = 1.016
  dimension "d45" = 1.27
  dimension "d46" = 1.016
  dimension "d47" = 1.016
  dimension "d49" = 0.635
  dimension "d50" = 3.175
  dimension "d51" = 12.7
  dimension "d52" = 2.159
  dimension "d53" = 2.54
  dimension "d54" = 25.4
  dimension "d55" = 0.635
  dimension "d56" = 25.5384
  dimension "d57" = 25.5384
  dimension "d58" = 15
  dimension "d59" = 1.016
  dimension "d60" = 0.635
extrude "Extrusion2" cut sketch "Sketch3" along normal through all contours L0 L9 L2 L1 | L20 L19 L9 L0 | L0 L16 L17 | L9 L8 L7 L0 | L0 L7 L2 L9 | L0 L3 L2 L7 | L2 L7 L6 L9 | L13 L12 L2 | L6 L15 L14 keep common part
equation "\"d15\" = 0.5 * d14"
equation "\"d17\" = 0.5 * d11"
equation "\"d22\" = 0.5 * d21"
equation "\"d24\" = d22"
equation "\"d32\" = 0.5 * d31"
properties part number "Team Pin Cad-Caliper"
